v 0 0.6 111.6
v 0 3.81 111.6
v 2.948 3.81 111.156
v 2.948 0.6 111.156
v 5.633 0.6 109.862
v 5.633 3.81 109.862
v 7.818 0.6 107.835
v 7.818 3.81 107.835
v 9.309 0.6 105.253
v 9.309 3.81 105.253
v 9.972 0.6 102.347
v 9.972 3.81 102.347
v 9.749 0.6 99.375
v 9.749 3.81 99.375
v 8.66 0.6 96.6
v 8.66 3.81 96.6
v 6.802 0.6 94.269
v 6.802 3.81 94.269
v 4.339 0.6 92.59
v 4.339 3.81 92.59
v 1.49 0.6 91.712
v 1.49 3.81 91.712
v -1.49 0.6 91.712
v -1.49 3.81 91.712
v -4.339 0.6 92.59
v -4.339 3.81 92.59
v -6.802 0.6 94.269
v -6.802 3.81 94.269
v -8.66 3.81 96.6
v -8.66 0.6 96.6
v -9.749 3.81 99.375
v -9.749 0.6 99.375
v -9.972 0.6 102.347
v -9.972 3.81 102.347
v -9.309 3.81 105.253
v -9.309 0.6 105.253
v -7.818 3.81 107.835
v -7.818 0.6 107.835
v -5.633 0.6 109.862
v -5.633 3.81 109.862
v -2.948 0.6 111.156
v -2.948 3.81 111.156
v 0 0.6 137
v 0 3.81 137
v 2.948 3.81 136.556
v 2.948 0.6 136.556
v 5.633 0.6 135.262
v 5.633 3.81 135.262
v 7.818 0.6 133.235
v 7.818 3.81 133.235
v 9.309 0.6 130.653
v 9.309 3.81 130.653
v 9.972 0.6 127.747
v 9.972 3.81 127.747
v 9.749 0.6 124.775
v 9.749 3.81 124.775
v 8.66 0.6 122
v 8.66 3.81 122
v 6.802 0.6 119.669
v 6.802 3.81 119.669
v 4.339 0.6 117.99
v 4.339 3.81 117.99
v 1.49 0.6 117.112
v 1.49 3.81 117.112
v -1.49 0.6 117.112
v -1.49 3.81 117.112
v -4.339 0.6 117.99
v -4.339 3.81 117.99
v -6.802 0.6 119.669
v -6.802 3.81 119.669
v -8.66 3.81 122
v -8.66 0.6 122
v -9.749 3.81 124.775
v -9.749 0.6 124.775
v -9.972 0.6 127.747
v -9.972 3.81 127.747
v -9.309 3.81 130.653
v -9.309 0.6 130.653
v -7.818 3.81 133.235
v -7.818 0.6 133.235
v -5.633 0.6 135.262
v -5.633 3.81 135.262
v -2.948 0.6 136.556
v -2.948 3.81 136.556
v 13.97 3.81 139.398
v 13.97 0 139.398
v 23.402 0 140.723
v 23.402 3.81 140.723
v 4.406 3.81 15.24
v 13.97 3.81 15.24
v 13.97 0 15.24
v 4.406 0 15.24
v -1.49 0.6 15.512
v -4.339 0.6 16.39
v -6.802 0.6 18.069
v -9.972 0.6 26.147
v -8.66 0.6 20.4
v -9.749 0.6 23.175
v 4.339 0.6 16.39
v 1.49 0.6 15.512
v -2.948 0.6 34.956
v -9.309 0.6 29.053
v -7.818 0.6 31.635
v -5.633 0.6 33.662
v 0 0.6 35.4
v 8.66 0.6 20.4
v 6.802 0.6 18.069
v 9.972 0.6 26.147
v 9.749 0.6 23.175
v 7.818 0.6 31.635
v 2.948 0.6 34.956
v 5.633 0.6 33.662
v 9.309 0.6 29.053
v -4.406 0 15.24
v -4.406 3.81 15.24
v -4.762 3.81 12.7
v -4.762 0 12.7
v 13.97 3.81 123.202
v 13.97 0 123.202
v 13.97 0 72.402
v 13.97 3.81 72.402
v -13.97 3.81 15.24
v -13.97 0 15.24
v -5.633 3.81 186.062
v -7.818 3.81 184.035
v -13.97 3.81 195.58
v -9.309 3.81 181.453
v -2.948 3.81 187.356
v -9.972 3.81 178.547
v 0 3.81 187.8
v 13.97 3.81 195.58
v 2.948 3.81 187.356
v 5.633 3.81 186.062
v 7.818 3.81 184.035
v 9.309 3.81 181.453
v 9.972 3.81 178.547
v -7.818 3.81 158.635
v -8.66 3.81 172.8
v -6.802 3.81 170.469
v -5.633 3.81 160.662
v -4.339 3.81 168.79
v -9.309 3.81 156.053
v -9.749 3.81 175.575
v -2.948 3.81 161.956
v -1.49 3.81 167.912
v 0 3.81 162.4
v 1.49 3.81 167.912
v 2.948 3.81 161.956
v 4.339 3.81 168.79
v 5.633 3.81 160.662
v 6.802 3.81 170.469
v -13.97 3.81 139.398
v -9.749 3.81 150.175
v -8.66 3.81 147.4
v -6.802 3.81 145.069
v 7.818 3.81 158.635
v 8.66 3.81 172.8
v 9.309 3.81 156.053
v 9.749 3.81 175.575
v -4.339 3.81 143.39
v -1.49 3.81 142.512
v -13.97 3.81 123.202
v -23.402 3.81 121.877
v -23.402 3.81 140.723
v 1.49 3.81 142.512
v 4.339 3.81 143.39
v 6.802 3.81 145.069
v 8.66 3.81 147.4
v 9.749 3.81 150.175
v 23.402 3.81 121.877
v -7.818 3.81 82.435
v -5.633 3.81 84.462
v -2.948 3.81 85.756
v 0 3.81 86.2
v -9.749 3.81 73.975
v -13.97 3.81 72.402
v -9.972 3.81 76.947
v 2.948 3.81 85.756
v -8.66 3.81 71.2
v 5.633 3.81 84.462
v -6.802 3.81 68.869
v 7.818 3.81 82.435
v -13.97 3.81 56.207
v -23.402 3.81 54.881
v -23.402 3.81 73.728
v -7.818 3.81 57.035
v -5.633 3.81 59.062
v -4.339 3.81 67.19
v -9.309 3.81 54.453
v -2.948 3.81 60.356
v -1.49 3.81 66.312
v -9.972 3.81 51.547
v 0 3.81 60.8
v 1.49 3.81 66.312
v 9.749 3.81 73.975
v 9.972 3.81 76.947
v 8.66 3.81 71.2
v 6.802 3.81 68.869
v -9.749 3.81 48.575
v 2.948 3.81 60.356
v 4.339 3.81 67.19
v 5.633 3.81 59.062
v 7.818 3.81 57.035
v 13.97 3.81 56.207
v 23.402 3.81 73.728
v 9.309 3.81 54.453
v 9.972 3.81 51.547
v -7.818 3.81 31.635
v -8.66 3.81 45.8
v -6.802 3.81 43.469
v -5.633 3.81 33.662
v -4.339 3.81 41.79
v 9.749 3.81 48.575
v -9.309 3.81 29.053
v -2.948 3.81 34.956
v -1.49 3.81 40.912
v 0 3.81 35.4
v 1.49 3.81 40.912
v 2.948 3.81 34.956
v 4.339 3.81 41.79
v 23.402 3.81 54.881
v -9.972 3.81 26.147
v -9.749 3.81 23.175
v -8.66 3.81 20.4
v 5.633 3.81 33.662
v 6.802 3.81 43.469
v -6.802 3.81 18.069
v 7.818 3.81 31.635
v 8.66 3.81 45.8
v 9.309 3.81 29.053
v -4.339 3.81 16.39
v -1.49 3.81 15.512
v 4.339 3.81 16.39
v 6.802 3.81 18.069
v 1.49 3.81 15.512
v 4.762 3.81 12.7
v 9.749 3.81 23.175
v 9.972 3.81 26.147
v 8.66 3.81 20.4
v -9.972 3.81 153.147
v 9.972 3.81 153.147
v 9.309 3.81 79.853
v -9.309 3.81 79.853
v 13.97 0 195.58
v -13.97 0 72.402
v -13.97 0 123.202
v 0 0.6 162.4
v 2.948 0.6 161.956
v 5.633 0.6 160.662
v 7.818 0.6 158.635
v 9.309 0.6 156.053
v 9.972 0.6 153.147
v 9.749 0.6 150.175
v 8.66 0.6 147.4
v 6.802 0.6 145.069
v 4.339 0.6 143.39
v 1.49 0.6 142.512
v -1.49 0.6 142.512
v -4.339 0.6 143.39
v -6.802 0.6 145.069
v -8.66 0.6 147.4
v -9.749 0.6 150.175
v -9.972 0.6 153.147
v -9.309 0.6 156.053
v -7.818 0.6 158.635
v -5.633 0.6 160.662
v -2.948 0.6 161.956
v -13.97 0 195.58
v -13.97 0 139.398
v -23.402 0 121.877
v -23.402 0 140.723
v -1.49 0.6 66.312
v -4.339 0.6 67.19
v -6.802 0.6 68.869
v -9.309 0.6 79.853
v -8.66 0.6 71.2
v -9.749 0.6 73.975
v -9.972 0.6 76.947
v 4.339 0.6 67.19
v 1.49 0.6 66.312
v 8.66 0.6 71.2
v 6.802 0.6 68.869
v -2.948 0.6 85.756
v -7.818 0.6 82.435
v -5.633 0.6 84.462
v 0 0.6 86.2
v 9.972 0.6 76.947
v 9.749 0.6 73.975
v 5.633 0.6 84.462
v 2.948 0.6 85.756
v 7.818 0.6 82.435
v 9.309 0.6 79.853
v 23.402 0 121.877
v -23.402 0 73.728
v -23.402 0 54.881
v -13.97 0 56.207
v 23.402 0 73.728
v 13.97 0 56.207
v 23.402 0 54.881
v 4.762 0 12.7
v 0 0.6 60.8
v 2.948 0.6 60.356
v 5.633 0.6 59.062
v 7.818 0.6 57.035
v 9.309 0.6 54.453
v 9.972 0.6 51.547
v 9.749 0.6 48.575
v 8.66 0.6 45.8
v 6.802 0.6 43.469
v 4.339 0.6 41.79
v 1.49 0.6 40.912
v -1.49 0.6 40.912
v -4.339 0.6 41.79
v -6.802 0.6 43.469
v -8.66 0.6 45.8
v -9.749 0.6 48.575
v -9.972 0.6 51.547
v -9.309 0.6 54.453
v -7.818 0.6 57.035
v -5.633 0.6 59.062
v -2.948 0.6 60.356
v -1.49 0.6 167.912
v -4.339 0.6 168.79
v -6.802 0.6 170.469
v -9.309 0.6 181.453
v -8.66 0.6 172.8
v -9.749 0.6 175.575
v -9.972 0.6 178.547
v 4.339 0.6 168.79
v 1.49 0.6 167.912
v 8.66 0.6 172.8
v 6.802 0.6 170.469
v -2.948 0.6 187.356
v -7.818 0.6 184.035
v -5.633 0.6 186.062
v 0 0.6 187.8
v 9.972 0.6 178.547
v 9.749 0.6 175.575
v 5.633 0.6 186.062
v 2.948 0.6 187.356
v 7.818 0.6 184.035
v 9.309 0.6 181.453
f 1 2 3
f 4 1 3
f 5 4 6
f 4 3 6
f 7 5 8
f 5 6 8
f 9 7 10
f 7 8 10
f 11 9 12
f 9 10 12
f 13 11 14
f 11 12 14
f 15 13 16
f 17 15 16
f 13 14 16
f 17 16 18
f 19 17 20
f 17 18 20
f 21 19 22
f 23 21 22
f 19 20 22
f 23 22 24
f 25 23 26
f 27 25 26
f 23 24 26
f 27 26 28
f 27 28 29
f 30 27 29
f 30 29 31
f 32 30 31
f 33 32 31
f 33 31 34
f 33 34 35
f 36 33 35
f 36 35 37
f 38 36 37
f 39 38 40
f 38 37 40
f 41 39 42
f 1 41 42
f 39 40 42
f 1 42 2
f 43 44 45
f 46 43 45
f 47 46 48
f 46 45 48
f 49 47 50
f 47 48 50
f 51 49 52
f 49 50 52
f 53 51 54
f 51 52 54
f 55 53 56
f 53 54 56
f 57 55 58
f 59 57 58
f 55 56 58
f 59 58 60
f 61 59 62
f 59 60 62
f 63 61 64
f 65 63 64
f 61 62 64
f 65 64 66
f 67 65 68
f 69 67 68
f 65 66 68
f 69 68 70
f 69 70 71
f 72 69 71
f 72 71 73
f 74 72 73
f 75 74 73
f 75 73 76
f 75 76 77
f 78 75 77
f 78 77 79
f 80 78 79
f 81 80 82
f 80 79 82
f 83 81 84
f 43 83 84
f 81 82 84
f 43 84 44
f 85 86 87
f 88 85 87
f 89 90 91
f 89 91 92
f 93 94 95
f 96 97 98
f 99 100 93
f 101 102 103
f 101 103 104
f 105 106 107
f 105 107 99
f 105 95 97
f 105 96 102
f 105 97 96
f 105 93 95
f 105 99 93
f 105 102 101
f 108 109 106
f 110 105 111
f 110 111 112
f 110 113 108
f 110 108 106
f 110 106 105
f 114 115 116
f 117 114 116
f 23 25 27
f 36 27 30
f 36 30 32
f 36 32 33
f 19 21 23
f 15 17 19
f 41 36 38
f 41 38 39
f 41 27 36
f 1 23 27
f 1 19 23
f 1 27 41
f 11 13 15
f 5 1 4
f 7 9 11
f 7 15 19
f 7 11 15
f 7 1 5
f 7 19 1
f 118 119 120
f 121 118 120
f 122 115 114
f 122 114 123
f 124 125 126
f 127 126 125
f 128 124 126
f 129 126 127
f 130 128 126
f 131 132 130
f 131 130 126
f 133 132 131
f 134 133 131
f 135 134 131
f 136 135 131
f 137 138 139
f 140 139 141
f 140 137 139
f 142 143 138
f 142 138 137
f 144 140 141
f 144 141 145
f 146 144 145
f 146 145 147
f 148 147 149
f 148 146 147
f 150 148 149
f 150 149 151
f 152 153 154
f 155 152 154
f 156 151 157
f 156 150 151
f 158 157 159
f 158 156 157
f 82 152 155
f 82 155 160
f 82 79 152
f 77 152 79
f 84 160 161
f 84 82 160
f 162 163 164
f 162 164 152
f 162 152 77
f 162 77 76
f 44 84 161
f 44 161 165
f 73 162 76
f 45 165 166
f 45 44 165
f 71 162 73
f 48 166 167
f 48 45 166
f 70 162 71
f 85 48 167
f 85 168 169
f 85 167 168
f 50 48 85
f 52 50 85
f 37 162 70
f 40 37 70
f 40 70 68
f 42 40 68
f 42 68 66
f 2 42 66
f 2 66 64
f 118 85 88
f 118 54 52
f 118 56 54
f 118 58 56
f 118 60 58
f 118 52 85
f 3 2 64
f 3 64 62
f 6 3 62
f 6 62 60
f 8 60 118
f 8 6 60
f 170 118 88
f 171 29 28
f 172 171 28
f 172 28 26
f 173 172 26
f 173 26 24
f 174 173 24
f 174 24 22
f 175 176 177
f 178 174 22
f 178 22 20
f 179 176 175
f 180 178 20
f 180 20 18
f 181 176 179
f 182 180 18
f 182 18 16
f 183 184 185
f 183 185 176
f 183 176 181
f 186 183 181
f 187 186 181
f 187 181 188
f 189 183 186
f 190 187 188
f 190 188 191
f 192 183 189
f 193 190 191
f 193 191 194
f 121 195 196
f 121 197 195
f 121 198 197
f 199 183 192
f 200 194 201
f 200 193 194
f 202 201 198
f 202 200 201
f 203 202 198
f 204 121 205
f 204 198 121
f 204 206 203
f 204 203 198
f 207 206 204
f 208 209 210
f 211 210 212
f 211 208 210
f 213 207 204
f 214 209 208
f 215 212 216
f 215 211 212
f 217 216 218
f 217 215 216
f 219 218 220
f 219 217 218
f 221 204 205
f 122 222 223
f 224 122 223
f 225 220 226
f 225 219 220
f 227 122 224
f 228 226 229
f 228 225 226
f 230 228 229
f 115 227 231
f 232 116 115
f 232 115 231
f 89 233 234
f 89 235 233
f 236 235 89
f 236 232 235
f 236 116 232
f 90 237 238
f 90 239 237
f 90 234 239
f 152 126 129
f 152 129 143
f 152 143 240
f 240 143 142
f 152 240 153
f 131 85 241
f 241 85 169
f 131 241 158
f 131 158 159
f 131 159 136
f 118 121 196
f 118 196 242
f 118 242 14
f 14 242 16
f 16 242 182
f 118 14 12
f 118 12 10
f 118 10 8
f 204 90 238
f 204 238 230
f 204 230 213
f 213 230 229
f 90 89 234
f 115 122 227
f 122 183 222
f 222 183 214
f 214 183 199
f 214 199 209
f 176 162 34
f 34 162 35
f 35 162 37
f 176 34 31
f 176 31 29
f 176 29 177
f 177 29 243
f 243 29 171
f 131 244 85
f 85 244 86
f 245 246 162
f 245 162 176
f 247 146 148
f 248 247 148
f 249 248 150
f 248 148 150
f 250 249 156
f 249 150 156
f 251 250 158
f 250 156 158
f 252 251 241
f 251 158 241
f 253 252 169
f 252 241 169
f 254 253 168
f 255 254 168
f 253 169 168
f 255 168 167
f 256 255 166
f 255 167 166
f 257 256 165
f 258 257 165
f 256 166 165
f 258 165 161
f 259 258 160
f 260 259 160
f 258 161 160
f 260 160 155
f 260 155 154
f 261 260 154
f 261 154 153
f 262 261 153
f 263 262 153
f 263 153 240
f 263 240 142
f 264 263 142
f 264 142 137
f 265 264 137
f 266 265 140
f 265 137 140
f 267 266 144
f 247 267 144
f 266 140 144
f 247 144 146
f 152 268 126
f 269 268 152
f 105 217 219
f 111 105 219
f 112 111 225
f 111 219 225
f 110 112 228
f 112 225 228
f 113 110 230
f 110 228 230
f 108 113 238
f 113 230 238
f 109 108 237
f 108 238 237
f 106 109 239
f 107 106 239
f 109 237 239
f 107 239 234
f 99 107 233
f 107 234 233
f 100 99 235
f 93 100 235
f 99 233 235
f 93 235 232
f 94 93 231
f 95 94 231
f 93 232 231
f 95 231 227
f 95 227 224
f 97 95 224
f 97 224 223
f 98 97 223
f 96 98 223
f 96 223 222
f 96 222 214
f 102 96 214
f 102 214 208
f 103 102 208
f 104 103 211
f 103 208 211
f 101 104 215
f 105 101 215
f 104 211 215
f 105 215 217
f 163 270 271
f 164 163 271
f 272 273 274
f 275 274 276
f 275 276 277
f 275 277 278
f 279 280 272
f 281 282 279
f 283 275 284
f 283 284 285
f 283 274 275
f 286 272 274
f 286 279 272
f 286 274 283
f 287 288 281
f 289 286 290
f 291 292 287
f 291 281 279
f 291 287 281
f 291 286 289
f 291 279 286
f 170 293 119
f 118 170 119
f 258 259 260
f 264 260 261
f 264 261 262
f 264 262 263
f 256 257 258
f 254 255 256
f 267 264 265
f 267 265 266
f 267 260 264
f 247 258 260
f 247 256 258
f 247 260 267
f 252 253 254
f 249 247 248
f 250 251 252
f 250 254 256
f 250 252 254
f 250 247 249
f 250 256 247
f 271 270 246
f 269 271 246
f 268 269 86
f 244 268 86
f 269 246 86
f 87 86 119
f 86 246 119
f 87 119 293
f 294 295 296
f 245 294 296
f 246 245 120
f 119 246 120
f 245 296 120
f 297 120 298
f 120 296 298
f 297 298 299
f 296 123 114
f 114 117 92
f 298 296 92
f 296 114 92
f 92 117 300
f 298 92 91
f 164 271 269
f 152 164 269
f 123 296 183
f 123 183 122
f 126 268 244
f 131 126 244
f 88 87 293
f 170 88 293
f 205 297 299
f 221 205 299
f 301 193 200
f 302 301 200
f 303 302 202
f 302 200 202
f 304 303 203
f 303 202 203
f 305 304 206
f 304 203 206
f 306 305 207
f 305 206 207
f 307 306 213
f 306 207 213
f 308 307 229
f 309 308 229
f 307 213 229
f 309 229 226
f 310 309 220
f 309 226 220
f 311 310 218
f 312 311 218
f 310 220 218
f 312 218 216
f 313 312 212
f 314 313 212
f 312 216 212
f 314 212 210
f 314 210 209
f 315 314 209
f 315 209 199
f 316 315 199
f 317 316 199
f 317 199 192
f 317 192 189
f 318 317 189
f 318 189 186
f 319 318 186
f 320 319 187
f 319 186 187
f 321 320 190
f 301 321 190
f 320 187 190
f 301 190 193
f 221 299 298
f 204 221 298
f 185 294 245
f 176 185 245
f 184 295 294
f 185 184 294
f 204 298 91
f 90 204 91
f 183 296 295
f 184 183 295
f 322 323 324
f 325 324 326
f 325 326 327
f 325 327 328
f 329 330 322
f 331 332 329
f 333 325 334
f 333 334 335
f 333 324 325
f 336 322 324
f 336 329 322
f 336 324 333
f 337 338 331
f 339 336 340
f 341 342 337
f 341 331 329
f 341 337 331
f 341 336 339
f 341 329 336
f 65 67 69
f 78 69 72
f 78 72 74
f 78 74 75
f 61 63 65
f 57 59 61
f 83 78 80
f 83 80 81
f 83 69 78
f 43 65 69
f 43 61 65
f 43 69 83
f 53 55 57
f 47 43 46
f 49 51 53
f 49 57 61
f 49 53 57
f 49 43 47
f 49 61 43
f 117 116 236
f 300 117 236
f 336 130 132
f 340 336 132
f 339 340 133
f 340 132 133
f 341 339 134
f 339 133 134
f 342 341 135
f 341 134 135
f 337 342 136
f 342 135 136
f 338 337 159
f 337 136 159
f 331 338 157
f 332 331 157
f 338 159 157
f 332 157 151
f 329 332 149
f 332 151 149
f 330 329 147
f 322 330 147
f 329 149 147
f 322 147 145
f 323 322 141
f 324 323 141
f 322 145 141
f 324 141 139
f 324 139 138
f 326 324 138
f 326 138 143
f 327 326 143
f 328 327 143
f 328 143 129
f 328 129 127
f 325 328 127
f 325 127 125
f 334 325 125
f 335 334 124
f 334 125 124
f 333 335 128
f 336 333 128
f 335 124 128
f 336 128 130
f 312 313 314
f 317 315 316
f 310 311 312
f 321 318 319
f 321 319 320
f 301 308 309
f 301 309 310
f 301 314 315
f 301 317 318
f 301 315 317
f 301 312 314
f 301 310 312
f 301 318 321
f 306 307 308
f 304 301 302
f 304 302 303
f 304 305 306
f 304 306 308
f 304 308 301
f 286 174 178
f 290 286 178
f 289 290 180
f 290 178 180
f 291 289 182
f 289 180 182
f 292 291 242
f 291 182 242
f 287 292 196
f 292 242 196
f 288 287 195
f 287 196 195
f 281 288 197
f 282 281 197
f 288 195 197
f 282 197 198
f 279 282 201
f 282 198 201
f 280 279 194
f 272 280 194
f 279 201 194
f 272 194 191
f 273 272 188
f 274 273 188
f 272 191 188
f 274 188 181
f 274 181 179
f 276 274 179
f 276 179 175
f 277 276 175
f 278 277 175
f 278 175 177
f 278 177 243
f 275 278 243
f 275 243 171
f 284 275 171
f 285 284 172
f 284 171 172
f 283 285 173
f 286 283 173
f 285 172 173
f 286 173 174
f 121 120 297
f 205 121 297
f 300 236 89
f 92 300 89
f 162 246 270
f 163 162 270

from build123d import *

# Parameters (mm, degrees)
SKETCH1_W           = 27.94
SKETCH1_H           = 391.16
BOSS_EXTRUDE1_DEPTH = 3.81
SKETCH2_R           = 10
CUT_EXTRUDE1_DEPTH  = 3.21
BOSS_EXTRUDE2_DEPTH = 3.81
SKETCH7_W           = 46.80460671
SKETCH7_H           = 3.81
CUT_EXTRUDE2_DEPTH  = 210.82
BOSS_EXTRUDE4_DEPTH = 3.81


with BuildPart() as part:
    # Sketch1 → Boss-Extrude1 (new body)
    with BuildSketch(Plane(origin=(0, 0, 0), x_dir=(1, 0, 0), z_dir=(0, 1, 0))):
        Rectangle(SKETCH1_W, SKETCH1_H)
    extrude(amount=BOSS_EXTRUDE1_DEPTH)

    # Sketch2 → Cut-Extrude1 (cut)
    with BuildSketch(Plane(origin=(0, 3.81, 0), x_dir=(1, 0, 0), z_dir=(0, 1, 0))):
        with Locations((0, 177.8)):
            Circle(SKETCH2_R)
        with Locations((0, 152.4)):
            Circle(SKETCH2_R)
        with Locations((0, 127)):
            Circle(SKETCH2_R)
        with Locations((0, 101.6)):
            Circle(SKETCH2_R)
        with Locations((0, 76.2)):
            Circle(SKETCH2_R)
        with Locations((0, 50.8)):
            Circle(SKETCH2_R)
        with Locations((0, 25.4)):
            Circle(SKETCH2_R)
        Circle(SKETCH2_R)
        with Locations((0, -25.4)):
            Circle(SKETCH2_R)
        with Locations((0, -50.8)):
            Circle(SKETCH2_R)
        with Locations((0, -76.2)):
            Circle(SKETCH2_R)
        with Locations((0, -101.6)):
            Circle(SKETCH2_R)
        with Locations((0, -127)):
            Circle(SKETCH2_R)
        with Locations((0, -152.4)):
            Circle(SKETCH2_R)
        with Locations((0, -177.8)):
            Circle(SKETCH2_R)
    extrude(amount=-CUT_EXTRUDE1_DEPTH, mode=Mode.SUBTRACT)

    # Sketch4 → Boss-Extrude2 (add)
    with BuildSketch(Plane(origin=(0, 0, 0), x_dir=(1, 0, 0), z_dir=(0, 1, 0))):
        Polygon((23.402303355, -54.881033493), (13.97, -56.20665728), (13.97, -72.402209707), (23.402303355, -73.727833493), align=None)
        Polygon((23.402303355, 146.105623787), (13.97, 144.78), (13.97, 128.584447573), (23.402303355, 127.258823787), align=None)
        Polygon((-13.97, 128.584447573), (-13.97, 144.78), (-23.402303355, 146.105623787), (-23.402303355, 127.258823787), align=None)
        Polygon((23.402303355, 79.11007136), (13.97, 77.784447573), (13.97, 61.588895147), (23.402303355, 60.26327136), align=None)
        Polygon((23.402303355, 12.114518933), (13.97, 10.788895147), (13.97, -5.40665728), (23.402303355, -6.732281067), align=None)
        Polygon((-13.97, -5.40665728), (-13.97, 10.788895147), (-23.402303355, 12.114518933), (-23.402303355, -6.732281067), align=None)
        Polygon((-13.97, 61.588895147), (-13.97, 77.784447573), (-23.402303355, 79.11007136), (-23.402303355, 60.26327136), align=None)
        Polygon((23.402303355, -121.87658592), (13.97, -123.202209707), (13.97, -139.397762134), (23.402303355, -140.72338592), align=None)
        Polygon((-13.97, -139.397762134), (-13.97, -123.202209707), (-23.402303355, -121.87658592), (-23.402303355, -140.72338592), align=None)
        Polygon((-13.97, -72.402209707), (-13.97, -56.20665728), (-23.402303355, -54.881033493), (-23.402303355, -73.727833493), align=None)
    extrude(amount=BOSS_EXTRUDE2_DEPTH)

    # Sketch7 → Cut-Extrude2 (cut)
    with BuildSketch(Plane(origin=(0, 0, -195.58), x_dir=(-1, 0, 0), z_dir=(0, 0, -1))):
        with Locations((0, 1.905)):
            Rectangle(SKETCH7_W, SKETCH7_H)
    extrude(amount=-CUT_EXTRUDE2_DEPTH, mode=Mode.SUBTRACT)

    # Sketch8 → Boss-Extrude4 (add)
    with BuildSketch(Plane(origin=(0, 3.81, 0), x_dir=(1, 0, 0), z_dir=(0, 1, 0))):
        Polygon((-4.40552628, -15.24), (-4.7625, -12.7), (4.7625, -12.7), (4.40552628, -15.24), align=None)
    extrude(amount=-BOSS_EXTRUDE4_DEPTH)


solid = part.part
